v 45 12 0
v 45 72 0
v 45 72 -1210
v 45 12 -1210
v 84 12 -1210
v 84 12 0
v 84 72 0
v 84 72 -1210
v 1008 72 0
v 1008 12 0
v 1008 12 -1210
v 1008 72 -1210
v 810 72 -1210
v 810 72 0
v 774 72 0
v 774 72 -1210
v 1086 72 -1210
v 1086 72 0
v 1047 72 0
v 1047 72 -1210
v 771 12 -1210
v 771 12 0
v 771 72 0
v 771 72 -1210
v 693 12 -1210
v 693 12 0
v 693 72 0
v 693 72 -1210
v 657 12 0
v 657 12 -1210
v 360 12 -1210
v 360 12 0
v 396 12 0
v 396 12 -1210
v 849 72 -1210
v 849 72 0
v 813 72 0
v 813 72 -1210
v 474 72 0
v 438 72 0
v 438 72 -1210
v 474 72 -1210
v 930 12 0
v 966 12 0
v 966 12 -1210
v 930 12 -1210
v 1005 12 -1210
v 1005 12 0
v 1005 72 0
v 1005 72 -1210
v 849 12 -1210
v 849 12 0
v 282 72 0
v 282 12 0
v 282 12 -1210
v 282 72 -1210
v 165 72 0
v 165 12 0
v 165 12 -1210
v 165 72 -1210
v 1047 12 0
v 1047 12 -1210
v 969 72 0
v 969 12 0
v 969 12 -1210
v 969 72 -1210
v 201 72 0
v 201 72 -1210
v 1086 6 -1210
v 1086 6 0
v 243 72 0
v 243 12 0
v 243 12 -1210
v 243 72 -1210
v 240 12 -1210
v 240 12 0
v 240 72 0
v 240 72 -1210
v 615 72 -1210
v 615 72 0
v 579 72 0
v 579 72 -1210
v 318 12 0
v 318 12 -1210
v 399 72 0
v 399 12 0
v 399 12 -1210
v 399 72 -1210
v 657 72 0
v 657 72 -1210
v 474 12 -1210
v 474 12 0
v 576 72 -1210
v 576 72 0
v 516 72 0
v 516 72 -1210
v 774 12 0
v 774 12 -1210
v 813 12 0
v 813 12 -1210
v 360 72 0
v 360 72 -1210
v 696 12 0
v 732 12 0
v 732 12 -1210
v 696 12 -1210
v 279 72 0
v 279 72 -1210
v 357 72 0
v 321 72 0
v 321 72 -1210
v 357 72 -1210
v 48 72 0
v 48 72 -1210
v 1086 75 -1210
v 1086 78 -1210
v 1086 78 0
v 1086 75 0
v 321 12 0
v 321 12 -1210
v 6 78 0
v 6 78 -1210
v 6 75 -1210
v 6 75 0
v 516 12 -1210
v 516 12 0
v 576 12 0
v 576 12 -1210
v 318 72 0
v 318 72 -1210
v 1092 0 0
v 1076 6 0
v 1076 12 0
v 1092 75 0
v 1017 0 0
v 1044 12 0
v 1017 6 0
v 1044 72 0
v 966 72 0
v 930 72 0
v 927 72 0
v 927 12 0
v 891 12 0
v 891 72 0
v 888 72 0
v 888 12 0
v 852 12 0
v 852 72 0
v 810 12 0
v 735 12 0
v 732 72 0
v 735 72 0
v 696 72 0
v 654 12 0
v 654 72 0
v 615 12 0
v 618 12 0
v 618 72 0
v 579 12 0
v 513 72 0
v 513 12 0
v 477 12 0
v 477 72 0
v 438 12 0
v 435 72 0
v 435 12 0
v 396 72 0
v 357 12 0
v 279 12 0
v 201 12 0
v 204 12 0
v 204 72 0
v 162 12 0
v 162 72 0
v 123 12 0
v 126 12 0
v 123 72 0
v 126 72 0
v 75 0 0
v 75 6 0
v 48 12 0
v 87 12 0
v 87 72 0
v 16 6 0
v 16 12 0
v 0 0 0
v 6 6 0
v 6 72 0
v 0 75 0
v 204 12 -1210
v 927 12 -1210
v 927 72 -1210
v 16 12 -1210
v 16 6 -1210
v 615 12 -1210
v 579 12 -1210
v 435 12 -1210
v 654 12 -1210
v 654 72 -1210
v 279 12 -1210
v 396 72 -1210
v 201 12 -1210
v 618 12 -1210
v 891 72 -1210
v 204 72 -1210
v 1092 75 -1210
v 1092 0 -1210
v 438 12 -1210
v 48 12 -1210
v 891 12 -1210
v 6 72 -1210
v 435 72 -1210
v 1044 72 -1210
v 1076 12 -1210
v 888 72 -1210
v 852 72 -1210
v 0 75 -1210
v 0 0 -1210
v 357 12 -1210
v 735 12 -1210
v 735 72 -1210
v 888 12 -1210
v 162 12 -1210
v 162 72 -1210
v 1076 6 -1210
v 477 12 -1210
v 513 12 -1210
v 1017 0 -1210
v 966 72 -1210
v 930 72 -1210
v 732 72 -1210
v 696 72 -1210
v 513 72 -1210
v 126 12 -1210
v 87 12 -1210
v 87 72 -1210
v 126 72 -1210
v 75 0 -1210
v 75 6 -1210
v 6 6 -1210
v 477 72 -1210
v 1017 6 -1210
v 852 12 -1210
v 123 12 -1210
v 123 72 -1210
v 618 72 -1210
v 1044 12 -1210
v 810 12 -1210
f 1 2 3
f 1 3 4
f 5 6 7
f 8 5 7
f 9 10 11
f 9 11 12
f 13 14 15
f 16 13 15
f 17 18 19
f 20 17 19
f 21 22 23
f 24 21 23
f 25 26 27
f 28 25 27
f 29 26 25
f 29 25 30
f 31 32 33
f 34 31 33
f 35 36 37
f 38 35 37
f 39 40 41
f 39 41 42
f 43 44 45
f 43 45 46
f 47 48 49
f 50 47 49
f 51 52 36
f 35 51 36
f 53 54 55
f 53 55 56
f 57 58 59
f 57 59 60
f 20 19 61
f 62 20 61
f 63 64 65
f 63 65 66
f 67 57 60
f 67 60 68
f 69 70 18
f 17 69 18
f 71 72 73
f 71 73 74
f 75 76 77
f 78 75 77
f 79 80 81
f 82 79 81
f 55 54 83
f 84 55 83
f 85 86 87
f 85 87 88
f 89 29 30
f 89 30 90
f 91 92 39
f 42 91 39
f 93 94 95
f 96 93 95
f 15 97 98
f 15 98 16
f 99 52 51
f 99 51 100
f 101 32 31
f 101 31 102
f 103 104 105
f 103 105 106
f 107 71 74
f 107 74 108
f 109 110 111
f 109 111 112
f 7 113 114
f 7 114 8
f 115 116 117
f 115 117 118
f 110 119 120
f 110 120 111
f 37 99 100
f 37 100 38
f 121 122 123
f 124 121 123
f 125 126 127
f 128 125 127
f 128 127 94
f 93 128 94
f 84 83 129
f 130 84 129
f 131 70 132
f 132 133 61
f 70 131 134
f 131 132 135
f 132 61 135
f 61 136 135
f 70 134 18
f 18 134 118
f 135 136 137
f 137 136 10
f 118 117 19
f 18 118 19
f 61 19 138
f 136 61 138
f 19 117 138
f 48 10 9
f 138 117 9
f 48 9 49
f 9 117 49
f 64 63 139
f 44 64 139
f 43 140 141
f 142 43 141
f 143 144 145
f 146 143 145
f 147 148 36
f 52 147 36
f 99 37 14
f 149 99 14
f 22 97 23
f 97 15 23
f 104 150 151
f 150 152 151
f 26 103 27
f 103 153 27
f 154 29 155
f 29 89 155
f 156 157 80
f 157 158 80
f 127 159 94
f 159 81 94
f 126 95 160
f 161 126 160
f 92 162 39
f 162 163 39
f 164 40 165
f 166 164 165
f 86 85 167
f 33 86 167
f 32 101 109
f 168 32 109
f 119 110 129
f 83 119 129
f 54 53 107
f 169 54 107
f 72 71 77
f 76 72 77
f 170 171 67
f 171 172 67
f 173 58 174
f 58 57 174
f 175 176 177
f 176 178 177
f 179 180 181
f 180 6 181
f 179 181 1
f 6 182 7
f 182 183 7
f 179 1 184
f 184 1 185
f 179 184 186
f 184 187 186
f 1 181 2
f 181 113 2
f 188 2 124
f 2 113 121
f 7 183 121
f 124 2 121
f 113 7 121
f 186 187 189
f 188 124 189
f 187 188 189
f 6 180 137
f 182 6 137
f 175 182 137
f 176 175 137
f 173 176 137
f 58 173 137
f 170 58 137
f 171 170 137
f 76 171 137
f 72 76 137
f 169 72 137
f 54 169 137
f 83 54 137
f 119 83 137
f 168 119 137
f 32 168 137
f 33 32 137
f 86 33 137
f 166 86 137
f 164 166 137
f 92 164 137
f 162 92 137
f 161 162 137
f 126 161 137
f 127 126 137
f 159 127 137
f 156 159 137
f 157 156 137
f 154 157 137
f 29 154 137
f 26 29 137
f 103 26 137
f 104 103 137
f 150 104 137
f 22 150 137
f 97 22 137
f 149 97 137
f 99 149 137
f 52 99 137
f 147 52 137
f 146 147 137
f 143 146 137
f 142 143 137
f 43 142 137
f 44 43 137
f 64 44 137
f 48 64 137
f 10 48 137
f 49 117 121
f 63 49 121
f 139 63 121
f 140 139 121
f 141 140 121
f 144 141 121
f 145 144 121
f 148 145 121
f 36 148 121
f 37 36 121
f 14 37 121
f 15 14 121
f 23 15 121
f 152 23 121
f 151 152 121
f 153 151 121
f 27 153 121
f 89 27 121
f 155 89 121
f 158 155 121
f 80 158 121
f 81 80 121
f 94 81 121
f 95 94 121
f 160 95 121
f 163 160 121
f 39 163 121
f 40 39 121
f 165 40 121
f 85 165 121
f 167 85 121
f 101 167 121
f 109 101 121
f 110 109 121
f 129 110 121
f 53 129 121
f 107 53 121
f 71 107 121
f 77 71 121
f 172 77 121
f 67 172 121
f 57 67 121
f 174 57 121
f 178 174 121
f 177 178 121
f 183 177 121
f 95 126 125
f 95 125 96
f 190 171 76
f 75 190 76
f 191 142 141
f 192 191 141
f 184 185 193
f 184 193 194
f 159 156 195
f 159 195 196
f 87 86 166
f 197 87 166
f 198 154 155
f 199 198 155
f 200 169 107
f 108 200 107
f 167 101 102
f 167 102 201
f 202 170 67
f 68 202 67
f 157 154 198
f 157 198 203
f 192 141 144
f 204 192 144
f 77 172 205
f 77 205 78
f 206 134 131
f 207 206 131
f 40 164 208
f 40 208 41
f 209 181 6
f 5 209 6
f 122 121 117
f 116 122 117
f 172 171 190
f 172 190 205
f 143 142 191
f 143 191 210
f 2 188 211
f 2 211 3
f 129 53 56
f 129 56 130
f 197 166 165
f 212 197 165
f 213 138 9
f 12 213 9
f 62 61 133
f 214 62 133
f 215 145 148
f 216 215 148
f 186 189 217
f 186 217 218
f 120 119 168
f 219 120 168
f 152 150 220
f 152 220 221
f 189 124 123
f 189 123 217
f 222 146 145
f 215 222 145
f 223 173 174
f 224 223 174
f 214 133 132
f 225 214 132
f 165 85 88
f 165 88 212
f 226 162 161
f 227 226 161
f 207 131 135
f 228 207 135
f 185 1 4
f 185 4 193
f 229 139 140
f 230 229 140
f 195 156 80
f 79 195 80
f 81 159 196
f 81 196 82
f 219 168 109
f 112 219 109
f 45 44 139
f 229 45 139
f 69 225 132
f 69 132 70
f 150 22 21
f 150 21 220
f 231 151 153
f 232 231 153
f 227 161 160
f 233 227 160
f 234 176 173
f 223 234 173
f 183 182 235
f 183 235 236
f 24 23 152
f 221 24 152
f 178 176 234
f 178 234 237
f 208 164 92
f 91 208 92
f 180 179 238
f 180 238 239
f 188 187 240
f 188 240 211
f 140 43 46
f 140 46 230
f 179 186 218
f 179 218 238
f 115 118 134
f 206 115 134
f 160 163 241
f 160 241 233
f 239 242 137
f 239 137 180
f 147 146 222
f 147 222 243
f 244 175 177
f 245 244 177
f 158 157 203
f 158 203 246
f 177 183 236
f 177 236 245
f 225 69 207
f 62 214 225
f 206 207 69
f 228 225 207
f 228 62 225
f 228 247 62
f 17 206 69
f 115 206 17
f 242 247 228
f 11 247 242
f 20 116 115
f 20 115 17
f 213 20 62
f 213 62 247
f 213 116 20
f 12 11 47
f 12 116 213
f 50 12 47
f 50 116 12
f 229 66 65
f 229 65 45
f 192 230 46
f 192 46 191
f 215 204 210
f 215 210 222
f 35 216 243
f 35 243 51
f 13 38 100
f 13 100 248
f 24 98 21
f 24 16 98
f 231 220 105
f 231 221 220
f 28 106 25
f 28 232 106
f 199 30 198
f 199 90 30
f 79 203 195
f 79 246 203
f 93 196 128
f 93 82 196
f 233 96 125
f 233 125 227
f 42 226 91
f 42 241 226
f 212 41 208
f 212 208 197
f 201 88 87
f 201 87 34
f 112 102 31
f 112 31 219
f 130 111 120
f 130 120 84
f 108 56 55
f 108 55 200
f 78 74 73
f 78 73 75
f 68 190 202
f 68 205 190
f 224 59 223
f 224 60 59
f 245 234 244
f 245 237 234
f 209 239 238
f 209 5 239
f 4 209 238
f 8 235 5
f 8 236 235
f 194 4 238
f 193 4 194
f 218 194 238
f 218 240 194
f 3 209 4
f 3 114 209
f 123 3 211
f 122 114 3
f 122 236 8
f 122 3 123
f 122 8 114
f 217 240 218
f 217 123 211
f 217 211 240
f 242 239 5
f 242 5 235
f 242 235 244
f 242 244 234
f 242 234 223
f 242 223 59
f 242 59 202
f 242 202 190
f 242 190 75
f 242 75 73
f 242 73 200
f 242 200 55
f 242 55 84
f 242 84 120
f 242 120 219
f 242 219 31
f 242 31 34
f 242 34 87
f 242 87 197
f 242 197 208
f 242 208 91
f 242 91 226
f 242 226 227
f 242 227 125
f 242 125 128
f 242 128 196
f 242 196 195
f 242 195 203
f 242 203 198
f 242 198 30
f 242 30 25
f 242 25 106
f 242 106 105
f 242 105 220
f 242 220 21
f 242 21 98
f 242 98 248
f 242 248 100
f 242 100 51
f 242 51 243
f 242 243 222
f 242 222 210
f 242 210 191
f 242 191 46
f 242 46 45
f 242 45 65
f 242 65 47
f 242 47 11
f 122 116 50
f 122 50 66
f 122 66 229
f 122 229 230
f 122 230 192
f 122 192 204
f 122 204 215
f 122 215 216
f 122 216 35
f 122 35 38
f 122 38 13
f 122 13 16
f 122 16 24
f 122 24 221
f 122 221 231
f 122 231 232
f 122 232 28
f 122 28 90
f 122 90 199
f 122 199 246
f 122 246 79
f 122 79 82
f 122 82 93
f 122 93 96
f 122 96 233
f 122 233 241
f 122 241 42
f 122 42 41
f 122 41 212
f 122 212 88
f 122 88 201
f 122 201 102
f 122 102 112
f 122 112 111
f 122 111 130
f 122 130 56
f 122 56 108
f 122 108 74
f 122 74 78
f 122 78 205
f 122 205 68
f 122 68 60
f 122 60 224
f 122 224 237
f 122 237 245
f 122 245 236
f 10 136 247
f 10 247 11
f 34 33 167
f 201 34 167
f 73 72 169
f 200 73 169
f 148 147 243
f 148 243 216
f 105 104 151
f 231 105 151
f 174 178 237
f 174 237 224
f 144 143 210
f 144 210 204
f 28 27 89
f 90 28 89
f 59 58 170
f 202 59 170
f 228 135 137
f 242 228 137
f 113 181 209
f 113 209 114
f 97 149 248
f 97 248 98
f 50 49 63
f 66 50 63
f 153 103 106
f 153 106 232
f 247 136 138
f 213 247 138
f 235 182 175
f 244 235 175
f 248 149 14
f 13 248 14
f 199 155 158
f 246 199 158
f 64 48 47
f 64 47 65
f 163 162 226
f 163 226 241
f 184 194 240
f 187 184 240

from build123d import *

# Parameters (mm, degrees)
SKETCH_1_W      = 36
SKETCH_1_H      = 60
EXTRUDE_1_DEPTH = 1210


with BuildPart() as part:
    # Эскиз1 → Вытянуть1 (new body)
    with BuildSketch(Plane.XY):
        Polygon((0, 75), (0, 0), (75, 0), (75, 6), (546, 6), (546, 12), (516, 12), (516, 72), (546, 72), (546, 78), (6, 78), (6, 75), align=None)
        with Locations((495, 42)):
            Rectangle(SKETCH_1_W, SKETCH_1_H, mode=Mode.SUBTRACT)
        with Locations((456, 42)):
            Rectangle(SKETCH_1_W, SKETCH_1_H, mode=Mode.SUBTRACT)
        with Locations((417, 42)):
            Rectangle(SKETCH_1_W, SKETCH_1_H, mode=Mode.SUBTRACT)
        with Locations((378, 42)):
            Rectangle(SKETCH_1_W, SKETCH_1_H, mode=Mode.SUBTRACT)
        with Locations((339, 42)):
            Rectangle(SKETCH_1_W, SKETCH_1_H, mode=Mode.SUBTRACT)
        with Locations((300, 42)):
            Rectangle(SKETCH_1_W, SKETCH_1_H, mode=Mode.SUBTRACT)
        with Locations((261, 42)):
            Rectangle(SKETCH_1_W, SKETCH_1_H, mode=Mode.SUBTRACT)
        with Locations((222, 42)):
            Rectangle(SKETCH_1_W, SKETCH_1_H, mode=Mode.SUBTRACT)
        with Locations((183, 42)):
            Rectangle(SKETCH_1_W, SKETCH_1_H, mode=Mode.SUBTRACT)
        with Locations((144, 42)):
            Rectangle(SKETCH_1_W, SKETCH_1_H, mode=Mode.SUBTRACT)
        with Locations((105, 42)):
            Rectangle(SKETCH_1_W, SKETCH_1_H, mode=Mode.SUBTRACT)
        with Locations((66, 42)):
            Rectangle(SKETCH_1_W, SKETCH_1_H, mode=Mode.SUBTRACT)
        Polygon((45, 12), (16, 12), (16, 6), (6, 6), (6, 72), (45, 72), align=None, mode=Mode.SUBTRACT)
    extrude(amount=-EXTRUDE_1_DEPTH)

    # Зеркальное отражение1: part across face


with BuildPart() as part_1:
    add(part.part)
    add(part.part.mirror(Plane(origin=(546, 9, -605), x_dir=(0, 0, 1), z_dir=(1, 0, 0))))


solid = part_1.part
